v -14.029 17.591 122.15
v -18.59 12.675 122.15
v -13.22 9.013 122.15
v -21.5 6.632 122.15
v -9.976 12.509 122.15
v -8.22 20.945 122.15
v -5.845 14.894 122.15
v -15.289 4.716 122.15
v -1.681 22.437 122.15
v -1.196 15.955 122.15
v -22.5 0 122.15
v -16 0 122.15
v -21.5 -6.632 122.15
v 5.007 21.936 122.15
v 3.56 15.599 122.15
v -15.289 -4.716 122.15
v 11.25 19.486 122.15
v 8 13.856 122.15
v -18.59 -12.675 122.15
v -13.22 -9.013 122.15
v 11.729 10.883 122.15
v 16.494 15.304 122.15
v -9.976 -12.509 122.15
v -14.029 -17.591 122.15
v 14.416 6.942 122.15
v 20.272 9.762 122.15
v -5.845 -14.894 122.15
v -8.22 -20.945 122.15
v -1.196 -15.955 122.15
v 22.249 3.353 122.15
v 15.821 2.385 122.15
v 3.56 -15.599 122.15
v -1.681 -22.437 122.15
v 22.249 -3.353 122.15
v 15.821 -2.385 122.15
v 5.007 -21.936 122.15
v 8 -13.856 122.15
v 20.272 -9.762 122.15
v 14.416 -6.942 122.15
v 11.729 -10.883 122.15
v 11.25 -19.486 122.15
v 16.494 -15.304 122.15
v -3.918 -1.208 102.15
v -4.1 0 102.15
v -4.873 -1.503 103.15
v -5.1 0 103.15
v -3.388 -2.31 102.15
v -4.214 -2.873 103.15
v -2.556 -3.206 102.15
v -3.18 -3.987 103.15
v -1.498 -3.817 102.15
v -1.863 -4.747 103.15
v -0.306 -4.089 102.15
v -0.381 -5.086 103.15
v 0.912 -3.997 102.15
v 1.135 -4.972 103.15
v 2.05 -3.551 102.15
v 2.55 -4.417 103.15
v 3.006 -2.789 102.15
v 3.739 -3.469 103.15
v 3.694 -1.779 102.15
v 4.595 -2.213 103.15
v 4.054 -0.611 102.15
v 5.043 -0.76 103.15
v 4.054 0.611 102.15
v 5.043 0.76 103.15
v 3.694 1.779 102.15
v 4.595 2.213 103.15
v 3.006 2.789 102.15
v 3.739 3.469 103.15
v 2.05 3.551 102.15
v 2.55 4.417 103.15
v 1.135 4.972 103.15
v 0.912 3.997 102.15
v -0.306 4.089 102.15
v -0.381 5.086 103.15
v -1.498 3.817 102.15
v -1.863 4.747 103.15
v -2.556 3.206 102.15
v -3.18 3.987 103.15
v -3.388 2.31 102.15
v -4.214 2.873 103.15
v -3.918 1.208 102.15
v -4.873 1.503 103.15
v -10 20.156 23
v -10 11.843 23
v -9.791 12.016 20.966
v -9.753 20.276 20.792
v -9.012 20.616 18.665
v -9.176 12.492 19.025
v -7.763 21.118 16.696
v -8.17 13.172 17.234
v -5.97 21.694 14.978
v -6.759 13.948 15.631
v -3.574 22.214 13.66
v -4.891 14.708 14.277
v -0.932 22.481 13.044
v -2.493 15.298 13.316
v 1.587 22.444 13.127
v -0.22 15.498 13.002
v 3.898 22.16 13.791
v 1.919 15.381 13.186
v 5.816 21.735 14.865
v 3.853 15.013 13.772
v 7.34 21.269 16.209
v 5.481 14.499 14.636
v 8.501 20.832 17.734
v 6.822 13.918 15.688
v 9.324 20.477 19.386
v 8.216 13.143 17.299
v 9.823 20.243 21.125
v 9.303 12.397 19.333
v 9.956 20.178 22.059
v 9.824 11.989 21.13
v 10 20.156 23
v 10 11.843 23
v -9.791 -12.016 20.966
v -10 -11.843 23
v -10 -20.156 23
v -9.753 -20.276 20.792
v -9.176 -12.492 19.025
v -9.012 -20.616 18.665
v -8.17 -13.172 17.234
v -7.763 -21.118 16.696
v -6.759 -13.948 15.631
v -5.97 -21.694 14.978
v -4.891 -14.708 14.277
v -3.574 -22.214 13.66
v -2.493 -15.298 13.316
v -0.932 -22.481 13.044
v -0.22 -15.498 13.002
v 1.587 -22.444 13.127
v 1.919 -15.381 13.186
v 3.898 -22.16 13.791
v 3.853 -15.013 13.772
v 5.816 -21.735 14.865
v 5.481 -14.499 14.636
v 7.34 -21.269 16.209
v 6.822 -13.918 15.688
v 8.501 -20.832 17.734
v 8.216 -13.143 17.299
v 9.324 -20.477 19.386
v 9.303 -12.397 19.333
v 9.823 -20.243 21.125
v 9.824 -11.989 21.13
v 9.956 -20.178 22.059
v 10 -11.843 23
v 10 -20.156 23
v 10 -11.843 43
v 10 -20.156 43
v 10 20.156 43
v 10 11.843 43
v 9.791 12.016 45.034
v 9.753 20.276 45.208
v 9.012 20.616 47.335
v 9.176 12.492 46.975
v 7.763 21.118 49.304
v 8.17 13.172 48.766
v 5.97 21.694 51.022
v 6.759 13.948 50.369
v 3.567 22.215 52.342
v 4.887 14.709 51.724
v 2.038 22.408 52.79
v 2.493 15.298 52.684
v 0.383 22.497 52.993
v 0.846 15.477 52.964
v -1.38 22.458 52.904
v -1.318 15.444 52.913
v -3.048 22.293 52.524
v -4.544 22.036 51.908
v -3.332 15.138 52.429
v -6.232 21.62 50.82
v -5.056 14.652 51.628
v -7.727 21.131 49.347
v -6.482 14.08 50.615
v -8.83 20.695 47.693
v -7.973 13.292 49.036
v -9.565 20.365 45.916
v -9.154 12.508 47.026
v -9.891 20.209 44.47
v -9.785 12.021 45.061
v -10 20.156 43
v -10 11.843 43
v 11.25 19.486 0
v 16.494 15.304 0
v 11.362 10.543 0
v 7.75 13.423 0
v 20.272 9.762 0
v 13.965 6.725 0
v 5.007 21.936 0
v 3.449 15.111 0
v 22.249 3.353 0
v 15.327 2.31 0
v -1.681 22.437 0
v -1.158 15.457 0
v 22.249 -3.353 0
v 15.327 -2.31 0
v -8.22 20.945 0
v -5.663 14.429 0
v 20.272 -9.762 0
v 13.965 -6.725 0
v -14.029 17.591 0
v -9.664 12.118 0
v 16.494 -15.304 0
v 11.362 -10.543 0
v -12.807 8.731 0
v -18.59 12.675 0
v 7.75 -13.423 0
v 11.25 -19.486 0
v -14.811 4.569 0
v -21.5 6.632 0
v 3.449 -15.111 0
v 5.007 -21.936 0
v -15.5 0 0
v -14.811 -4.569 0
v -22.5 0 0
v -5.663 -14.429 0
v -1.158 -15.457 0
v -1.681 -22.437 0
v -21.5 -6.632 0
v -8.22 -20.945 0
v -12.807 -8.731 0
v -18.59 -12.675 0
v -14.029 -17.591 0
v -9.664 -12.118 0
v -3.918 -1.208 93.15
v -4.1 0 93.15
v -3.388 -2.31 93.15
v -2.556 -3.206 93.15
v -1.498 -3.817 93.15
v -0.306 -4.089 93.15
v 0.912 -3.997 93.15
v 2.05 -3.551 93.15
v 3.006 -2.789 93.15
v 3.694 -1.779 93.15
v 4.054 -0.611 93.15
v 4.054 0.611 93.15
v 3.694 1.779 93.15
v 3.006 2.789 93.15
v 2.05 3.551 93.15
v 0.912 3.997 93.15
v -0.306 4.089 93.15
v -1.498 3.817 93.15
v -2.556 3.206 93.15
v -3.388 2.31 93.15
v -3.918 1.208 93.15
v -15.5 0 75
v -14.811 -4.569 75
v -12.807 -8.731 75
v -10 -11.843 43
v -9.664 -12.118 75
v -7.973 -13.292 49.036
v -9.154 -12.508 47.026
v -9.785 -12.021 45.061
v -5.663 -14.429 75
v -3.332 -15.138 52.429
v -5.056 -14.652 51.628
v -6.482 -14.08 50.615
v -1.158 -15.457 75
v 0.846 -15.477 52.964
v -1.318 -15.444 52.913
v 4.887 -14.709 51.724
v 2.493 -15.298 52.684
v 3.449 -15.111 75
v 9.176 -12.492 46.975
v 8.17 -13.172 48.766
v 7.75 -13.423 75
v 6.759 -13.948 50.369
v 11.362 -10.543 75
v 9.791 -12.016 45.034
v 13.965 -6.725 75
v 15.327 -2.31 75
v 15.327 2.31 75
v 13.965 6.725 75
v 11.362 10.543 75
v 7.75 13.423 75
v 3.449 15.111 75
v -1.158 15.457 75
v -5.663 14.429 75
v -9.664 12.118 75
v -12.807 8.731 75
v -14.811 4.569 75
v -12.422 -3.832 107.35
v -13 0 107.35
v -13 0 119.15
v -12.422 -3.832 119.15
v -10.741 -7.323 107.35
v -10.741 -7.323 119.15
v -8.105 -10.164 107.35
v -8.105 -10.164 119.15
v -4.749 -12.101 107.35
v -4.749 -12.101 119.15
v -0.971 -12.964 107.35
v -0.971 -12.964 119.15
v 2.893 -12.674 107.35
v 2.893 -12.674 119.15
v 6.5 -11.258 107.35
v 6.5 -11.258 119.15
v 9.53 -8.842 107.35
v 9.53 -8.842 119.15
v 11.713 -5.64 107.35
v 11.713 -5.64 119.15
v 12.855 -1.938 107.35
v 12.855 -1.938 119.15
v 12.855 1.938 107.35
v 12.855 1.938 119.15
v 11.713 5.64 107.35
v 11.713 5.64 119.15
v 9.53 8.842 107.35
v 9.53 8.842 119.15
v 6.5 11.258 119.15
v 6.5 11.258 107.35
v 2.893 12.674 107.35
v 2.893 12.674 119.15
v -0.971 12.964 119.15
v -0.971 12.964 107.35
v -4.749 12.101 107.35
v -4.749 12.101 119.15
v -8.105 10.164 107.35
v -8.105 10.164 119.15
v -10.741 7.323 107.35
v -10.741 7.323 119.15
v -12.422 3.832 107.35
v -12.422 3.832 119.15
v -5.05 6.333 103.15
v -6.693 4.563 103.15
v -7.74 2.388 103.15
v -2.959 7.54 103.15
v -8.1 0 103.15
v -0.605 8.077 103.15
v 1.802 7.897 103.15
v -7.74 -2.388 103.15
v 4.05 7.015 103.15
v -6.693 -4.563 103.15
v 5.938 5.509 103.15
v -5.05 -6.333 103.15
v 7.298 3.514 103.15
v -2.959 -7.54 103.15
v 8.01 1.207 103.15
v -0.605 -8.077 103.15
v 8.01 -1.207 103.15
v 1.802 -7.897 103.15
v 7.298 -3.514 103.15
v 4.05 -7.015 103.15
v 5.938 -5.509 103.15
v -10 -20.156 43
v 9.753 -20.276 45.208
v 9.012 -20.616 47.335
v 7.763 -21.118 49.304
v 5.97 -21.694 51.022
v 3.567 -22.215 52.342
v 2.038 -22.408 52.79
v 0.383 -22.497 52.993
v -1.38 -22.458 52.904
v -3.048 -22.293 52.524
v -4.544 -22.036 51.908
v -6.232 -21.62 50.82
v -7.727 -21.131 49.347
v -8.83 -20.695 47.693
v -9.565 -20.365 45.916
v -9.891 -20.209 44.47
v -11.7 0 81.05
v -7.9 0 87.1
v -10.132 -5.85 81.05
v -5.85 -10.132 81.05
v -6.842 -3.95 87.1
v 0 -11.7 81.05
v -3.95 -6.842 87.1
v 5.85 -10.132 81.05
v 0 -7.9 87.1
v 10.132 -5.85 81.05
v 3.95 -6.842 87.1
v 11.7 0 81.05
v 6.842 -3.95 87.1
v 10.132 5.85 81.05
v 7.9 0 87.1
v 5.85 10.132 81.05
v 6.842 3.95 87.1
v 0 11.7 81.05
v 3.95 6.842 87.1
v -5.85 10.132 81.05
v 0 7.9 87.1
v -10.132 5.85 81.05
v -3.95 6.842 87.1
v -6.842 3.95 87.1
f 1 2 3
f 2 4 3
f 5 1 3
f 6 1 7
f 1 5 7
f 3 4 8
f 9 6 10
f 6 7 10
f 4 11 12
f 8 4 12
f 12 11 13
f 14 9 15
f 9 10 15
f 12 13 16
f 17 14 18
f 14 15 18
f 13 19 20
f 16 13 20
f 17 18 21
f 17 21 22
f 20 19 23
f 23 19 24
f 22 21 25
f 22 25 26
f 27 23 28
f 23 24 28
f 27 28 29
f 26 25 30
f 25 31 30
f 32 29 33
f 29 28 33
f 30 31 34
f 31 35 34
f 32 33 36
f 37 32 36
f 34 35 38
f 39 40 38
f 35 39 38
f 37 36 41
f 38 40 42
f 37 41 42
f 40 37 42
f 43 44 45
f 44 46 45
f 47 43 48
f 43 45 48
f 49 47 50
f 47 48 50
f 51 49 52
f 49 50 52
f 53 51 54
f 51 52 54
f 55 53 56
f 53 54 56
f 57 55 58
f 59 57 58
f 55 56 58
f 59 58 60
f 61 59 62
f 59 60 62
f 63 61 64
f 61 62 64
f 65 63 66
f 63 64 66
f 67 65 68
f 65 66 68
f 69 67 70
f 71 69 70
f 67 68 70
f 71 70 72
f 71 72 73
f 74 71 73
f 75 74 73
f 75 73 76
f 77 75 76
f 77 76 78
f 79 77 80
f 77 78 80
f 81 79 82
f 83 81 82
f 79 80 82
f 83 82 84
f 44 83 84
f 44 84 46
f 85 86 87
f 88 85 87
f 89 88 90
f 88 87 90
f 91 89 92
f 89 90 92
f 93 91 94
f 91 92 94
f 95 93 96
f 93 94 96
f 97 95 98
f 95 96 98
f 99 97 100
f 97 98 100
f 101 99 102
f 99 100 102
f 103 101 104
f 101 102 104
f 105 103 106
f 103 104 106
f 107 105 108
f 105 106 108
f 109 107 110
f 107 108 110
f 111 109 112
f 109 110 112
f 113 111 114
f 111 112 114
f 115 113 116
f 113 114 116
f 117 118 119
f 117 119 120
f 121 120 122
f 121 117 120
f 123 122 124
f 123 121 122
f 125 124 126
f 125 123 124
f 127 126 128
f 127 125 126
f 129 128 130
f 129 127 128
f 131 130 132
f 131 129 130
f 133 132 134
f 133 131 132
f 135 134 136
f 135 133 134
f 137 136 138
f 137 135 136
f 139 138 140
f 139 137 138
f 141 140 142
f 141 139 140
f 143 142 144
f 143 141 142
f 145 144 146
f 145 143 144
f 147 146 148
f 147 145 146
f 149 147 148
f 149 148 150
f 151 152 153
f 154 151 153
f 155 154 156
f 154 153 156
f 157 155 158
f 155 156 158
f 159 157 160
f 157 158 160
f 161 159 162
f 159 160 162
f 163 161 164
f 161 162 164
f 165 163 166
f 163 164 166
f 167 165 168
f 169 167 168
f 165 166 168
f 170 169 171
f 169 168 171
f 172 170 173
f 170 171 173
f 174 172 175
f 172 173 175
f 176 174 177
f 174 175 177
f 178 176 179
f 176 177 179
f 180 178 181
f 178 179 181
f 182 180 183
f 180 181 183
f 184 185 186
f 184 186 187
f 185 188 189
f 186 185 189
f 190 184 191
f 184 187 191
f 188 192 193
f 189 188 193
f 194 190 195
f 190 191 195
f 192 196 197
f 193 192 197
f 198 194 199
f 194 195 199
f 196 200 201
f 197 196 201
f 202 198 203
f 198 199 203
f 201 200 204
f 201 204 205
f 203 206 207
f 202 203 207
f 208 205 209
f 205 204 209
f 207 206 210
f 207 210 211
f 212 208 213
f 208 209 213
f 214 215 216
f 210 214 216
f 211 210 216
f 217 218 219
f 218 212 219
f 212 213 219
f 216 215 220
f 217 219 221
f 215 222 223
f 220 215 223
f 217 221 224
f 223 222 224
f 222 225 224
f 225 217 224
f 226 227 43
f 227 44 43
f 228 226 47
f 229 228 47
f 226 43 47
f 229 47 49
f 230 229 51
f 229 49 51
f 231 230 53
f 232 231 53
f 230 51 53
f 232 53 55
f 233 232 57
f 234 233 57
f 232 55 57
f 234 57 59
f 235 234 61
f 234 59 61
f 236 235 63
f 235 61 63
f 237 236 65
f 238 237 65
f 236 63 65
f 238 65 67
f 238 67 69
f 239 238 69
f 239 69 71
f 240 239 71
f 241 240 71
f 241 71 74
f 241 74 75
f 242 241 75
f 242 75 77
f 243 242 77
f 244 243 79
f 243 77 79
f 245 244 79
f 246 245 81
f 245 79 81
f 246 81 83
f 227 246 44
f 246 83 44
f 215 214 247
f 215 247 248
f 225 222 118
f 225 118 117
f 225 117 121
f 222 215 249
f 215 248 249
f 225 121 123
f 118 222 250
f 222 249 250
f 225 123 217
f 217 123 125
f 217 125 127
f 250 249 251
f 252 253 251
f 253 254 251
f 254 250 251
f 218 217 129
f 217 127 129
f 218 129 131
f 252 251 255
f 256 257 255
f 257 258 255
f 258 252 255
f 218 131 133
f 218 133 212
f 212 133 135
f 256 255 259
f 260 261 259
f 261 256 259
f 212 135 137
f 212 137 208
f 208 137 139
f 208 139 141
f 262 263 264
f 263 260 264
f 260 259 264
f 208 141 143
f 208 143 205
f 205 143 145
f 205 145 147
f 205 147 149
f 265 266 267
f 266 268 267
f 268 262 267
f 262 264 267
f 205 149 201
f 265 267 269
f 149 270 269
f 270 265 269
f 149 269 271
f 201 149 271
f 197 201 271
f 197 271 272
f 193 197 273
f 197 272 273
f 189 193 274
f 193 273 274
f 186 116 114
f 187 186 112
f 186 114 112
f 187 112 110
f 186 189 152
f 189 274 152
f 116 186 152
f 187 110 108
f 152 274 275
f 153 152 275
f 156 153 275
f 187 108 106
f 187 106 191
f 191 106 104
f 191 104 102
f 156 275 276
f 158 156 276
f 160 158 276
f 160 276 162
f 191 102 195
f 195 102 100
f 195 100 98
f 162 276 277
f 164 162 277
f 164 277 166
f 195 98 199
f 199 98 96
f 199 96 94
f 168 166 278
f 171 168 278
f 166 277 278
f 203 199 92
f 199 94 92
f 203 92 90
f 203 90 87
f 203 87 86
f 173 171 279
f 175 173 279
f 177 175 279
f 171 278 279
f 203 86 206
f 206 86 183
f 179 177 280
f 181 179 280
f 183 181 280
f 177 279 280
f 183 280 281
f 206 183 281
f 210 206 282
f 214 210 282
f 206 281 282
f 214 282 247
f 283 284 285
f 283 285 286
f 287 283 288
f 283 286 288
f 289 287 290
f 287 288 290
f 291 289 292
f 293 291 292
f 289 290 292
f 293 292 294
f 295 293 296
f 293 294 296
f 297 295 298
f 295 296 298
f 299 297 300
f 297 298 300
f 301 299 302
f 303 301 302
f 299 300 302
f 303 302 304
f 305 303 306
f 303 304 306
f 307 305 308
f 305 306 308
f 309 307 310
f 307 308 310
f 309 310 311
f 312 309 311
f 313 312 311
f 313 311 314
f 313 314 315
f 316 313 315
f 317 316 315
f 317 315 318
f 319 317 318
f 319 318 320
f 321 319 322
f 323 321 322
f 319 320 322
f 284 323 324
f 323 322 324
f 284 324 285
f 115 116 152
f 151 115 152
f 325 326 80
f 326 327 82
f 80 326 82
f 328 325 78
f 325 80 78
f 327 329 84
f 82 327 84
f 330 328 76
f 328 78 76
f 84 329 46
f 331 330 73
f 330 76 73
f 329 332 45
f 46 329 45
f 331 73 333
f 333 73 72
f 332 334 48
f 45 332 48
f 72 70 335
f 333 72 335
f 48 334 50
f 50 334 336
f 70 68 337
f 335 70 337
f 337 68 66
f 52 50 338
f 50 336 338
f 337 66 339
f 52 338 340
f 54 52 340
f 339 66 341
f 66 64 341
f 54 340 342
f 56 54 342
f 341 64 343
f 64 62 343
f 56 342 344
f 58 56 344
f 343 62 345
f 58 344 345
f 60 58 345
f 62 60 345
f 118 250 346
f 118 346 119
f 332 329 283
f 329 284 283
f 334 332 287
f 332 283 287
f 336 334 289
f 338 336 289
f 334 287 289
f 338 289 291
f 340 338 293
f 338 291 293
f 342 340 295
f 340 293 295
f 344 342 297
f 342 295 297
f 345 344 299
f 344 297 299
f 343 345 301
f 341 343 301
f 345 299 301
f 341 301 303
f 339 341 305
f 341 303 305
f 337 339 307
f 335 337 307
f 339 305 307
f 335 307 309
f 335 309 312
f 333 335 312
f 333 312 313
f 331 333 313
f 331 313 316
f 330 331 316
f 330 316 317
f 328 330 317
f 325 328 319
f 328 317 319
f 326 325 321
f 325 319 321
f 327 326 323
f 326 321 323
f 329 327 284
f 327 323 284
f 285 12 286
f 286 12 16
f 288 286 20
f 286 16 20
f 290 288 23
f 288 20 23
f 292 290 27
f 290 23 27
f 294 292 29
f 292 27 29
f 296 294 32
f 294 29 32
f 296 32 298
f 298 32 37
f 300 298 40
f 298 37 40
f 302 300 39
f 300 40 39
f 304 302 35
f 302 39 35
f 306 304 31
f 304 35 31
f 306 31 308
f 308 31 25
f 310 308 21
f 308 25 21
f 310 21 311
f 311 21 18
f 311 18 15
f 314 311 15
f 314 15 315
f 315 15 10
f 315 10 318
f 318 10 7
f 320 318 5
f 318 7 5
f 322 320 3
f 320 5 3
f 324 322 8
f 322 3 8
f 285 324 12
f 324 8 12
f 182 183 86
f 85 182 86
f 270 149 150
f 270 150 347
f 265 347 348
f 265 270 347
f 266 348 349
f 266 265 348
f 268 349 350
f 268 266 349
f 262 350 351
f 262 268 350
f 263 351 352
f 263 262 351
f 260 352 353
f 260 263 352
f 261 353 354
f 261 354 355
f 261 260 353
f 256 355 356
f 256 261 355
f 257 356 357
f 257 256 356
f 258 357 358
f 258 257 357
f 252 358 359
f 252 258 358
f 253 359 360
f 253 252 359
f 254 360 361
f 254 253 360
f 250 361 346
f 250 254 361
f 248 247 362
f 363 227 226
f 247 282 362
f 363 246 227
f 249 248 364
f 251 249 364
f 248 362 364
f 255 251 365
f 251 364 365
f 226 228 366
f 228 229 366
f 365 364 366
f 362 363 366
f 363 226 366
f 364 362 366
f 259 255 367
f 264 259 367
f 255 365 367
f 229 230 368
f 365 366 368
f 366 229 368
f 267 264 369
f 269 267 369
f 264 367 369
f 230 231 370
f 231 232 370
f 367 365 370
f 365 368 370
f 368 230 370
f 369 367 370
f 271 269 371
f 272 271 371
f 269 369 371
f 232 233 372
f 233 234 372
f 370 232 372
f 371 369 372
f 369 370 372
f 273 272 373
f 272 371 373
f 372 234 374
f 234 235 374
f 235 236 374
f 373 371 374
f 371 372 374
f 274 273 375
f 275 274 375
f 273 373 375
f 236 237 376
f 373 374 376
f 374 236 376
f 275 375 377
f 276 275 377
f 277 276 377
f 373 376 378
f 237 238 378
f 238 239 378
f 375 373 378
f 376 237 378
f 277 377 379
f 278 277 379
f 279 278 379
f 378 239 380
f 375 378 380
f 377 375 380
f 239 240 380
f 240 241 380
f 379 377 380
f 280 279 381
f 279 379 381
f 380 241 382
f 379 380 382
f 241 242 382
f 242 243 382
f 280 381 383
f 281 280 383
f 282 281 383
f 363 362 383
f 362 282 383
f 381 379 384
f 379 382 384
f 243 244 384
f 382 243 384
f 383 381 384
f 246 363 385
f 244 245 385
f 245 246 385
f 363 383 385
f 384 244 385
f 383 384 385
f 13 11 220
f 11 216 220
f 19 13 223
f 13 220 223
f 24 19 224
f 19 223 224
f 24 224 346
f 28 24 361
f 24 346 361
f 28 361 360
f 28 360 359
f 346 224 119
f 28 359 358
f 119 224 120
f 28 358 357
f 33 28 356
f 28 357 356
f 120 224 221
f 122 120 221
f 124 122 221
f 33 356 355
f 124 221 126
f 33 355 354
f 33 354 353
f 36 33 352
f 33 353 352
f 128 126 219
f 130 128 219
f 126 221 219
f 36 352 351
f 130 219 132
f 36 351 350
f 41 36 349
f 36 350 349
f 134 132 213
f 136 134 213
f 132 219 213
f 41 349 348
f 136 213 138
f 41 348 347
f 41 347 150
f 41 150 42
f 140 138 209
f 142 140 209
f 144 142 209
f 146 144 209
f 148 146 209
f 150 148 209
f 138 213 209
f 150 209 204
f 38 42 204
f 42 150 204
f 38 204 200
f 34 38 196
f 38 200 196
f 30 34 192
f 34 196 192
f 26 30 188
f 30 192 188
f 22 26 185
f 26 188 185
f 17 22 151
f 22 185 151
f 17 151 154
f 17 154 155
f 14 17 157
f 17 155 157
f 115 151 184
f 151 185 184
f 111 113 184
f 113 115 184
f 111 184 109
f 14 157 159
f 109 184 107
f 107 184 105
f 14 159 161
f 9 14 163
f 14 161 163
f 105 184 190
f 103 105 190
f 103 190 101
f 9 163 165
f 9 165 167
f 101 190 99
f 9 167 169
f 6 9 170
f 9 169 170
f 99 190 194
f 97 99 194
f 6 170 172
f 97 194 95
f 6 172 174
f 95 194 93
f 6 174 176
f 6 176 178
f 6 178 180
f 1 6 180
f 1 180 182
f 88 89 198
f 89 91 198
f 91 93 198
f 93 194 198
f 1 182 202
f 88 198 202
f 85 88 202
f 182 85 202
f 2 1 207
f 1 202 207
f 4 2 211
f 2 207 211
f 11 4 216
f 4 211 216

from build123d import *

# Parameters (mm, degrees)
POCKET_DEPTH      = 22.501
POCKET_DEPTH_BACK = -22.501


with BuildPart() as part:
    # Sketch → Revolution (revolve)
    with BuildSketch(Plane.XZ):
        Polygon((-22.5, 0), (-15.5, 0), (-15.5, 75), (-4.1, 93.15), (-4.1, 102.15), (-5.1, 103.15), (-8.1, 103.15), (-13, 107.35), (-13, 119.15), (-16, 122.15), (-22.5, 122.15), align=None)
    revolve(axis=Axis((0, 0, 0), (0, 0, 1)))

    # Sketch001 → Pocket (cut, two sides)
    with BuildSketch(Plane.XZ) as pocket_sk:
        with BuildLine():
            ThreePointArc((-10, 23), (0, 13), (10, 23))
            Line((10, 23), (10, 43))
            ThreePointArc((10, 43), (0, 53), (-10, 43))
            Line((-10, 43), (-10, 23))
        make_face()
    extrude(amount=-POCKET_DEPTH, mode=Mode.SUBTRACT)
    extrude(pocket_sk.sketch, amount=-POCKET_DEPTH_BACK, mode=Mode.SUBTRACT)


solid = part.part
